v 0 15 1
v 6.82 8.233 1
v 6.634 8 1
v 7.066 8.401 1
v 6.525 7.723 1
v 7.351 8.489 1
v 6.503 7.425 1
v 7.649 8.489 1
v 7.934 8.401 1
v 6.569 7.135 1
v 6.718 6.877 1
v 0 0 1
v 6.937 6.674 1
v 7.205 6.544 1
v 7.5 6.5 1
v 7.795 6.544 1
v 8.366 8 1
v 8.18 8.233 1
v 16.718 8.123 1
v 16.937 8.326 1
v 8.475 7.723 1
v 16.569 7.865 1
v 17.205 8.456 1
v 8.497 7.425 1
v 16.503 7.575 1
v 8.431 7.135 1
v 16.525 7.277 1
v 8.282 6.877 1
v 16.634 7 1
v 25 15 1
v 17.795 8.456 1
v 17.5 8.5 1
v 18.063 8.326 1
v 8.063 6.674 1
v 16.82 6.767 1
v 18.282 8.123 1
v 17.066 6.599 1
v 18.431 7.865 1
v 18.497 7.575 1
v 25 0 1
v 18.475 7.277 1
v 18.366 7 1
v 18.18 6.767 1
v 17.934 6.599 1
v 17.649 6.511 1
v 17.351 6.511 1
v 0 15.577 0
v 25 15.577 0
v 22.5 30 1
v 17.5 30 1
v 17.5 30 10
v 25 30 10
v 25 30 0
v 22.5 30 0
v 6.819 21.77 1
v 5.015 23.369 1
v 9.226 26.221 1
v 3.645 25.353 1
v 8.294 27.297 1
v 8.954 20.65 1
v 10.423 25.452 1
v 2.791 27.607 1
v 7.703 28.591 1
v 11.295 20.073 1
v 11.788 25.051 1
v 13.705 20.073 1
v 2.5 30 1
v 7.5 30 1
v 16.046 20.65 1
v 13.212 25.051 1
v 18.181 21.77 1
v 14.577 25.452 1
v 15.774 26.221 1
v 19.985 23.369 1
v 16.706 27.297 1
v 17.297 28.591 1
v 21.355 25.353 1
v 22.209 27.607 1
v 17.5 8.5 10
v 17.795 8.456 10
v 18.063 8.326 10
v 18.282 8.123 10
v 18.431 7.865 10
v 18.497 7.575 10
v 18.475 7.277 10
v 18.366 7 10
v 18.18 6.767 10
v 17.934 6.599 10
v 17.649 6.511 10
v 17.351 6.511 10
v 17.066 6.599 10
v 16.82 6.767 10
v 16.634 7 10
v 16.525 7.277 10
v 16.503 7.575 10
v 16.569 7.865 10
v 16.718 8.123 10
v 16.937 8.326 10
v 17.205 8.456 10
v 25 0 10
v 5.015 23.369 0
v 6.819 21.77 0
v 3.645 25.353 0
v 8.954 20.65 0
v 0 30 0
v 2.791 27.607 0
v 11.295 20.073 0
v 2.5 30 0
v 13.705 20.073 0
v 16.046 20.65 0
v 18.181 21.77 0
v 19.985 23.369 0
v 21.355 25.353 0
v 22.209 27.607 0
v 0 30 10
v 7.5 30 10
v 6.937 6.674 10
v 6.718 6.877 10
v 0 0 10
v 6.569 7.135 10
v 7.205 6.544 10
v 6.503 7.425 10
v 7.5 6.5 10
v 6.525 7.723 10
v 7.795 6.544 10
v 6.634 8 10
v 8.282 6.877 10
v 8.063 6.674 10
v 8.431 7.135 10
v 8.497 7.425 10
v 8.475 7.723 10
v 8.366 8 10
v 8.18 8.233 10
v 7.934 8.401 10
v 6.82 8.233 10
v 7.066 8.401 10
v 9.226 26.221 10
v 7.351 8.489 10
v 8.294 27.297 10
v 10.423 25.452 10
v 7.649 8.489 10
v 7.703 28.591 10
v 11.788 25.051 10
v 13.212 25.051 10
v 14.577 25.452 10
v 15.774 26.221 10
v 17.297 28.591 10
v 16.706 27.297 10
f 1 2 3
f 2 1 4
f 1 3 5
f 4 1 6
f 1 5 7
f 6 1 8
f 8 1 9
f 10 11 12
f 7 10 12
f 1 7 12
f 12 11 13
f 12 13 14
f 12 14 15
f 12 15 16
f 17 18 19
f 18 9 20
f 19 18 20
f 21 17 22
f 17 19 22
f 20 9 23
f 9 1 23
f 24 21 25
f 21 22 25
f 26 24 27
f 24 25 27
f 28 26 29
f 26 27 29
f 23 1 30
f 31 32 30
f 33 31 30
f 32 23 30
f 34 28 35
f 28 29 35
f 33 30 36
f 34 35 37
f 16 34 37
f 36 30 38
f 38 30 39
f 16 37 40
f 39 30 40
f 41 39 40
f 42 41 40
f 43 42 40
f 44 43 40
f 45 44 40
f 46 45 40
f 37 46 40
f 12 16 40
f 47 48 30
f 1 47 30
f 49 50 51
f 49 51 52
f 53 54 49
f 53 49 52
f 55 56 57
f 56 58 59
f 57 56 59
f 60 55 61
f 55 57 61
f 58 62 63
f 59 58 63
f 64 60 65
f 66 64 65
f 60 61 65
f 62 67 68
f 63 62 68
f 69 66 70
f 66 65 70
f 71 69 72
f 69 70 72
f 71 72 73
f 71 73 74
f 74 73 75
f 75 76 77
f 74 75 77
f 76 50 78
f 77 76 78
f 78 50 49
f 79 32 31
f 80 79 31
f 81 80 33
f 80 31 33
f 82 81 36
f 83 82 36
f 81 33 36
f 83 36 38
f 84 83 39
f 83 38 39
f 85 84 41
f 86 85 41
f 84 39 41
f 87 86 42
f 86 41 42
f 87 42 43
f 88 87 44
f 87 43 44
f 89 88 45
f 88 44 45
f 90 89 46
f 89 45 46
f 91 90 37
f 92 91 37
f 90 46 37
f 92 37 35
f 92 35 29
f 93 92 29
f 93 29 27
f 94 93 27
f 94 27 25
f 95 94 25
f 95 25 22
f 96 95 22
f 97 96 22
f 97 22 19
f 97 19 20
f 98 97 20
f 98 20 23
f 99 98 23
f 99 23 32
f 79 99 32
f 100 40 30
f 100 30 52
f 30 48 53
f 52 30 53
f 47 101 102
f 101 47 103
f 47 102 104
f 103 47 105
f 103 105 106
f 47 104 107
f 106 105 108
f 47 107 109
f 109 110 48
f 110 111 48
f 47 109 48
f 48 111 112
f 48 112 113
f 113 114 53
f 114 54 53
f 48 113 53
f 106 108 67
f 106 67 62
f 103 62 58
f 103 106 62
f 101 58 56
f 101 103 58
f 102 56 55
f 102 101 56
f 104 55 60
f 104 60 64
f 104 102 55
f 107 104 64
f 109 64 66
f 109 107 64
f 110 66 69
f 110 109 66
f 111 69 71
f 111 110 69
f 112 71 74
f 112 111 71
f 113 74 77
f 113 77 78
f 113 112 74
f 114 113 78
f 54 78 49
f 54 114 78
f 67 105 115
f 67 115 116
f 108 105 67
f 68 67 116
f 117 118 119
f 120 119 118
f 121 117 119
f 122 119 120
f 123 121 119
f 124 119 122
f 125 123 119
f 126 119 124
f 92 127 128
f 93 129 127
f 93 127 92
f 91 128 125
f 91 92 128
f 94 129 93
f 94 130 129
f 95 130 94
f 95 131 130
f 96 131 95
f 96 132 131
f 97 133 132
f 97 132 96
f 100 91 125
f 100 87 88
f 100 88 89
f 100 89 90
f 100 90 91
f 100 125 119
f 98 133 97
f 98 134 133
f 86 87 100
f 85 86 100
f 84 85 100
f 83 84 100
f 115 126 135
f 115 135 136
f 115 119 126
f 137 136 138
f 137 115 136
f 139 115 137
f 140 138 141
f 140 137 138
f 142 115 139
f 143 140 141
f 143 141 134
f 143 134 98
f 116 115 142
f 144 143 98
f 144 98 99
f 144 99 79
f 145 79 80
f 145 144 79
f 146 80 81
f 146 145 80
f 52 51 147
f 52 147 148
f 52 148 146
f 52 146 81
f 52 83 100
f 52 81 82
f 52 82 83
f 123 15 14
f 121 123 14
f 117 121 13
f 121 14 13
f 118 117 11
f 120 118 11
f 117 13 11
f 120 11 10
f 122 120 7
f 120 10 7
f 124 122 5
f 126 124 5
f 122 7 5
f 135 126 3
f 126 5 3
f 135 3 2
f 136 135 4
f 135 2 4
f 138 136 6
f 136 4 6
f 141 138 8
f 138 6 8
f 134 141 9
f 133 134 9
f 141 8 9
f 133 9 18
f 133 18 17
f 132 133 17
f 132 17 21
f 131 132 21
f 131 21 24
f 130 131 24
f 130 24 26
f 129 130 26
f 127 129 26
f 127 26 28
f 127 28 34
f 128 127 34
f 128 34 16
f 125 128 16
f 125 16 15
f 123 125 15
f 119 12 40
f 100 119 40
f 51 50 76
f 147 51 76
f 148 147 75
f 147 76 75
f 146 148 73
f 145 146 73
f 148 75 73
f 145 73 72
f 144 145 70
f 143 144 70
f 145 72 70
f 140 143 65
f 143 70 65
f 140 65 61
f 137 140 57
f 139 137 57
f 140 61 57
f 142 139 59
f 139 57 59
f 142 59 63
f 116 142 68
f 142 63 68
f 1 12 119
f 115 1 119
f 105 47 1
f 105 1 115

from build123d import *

# Parameters (mm, degrees)
SKETCH1_W           = 25
SKETCH1_H           = 30
BOSS_EXTRUDE1_DEPTH = 10
CUT_EXTRUDE1_DEPTH  = 41.311288741
CUT_EXTRUDE2_DEPTH  = 1
CUT_EXTRUDE3_DEPTH  = 41.074929819
SKETCH5_R           = 1
CUT_EXTRUDE5_DEPTH  = 41.074929819


with BuildPart() as part:
    # Sketch1 → Boss-Extrude1 (new body)
    with BuildSketch(Plane.XY):
        with Locations((12.5, 15)):
            Rectangle(SKETCH1_W, SKETCH1_H)
    extrude(amount=BOSS_EXTRUDE1_DEPTH)

    # Sketch2 → Cut-Extrude1 (cut, through all)
    with BuildSketch(Plane(origin=(25, 0, 0), x_dir=(0, 0, -1), z_dir=(1, 0, 0))):
        Polygon((0, 15.577350269), (-1, 15), (-1, 0), (0, 0), align=None)
    extrude(amount=-CUT_EXTRUDE1_DEPTH, mode=Mode.SUBTRACT)

    # Sketch3 → Cut-Extrude2 (cut)
    with BuildSketch(Plane(origin=(0, 0, 0), x_dir=(-1, 0, 0), z_dir=(0, 0, -1))):
        with BuildLine():
            Line((-22.5, 30), (-2.5, 30))
            ThreePointArc((-2.5, 30), (-12.5, 20), (-22.5, 30))
        make_face()
    extrude(amount=-CUT_EXTRUDE2_DEPTH, mode=Mode.SUBTRACT)

    # Sketch4 → Cut-Extrude3 (cut, through all)
    with BuildSketch(Plane(origin=(0, 0, 1), x_dir=(-1, 0, 0), z_dir=(0, 0, -1))):
        with BuildLine():
            Line((-7.5, 30), (-17.5, 30))
            ThreePointArc((-17.5, 30), (-12.5, 25), (-7.5, 30))
        make_face()
    extrude(amount=-CUT_EXTRUDE3_DEPTH, mode=Mode.SUBTRACT)

    # Sketch5 → Cut-Extrude5 (cut, through all)
    with BuildSketch(Plane(origin=(0, 0, 1), x_dir=(-1, 0, 0), z_dir=(0, 0, -1))):
        with Locations(Location((-17.5, 7.5, 0), (0, 0, 90))):
            Circle(SKETCH5_R)
        with Locations(Location((-7.5, 7.5, 0), (0, 0, 270))):
            Circle(SKETCH5_R)
    extrude(amount=-CUT_EXTRUDE5_DEPTH, mode=Mode.SUBTRACT)


solid = part.part
